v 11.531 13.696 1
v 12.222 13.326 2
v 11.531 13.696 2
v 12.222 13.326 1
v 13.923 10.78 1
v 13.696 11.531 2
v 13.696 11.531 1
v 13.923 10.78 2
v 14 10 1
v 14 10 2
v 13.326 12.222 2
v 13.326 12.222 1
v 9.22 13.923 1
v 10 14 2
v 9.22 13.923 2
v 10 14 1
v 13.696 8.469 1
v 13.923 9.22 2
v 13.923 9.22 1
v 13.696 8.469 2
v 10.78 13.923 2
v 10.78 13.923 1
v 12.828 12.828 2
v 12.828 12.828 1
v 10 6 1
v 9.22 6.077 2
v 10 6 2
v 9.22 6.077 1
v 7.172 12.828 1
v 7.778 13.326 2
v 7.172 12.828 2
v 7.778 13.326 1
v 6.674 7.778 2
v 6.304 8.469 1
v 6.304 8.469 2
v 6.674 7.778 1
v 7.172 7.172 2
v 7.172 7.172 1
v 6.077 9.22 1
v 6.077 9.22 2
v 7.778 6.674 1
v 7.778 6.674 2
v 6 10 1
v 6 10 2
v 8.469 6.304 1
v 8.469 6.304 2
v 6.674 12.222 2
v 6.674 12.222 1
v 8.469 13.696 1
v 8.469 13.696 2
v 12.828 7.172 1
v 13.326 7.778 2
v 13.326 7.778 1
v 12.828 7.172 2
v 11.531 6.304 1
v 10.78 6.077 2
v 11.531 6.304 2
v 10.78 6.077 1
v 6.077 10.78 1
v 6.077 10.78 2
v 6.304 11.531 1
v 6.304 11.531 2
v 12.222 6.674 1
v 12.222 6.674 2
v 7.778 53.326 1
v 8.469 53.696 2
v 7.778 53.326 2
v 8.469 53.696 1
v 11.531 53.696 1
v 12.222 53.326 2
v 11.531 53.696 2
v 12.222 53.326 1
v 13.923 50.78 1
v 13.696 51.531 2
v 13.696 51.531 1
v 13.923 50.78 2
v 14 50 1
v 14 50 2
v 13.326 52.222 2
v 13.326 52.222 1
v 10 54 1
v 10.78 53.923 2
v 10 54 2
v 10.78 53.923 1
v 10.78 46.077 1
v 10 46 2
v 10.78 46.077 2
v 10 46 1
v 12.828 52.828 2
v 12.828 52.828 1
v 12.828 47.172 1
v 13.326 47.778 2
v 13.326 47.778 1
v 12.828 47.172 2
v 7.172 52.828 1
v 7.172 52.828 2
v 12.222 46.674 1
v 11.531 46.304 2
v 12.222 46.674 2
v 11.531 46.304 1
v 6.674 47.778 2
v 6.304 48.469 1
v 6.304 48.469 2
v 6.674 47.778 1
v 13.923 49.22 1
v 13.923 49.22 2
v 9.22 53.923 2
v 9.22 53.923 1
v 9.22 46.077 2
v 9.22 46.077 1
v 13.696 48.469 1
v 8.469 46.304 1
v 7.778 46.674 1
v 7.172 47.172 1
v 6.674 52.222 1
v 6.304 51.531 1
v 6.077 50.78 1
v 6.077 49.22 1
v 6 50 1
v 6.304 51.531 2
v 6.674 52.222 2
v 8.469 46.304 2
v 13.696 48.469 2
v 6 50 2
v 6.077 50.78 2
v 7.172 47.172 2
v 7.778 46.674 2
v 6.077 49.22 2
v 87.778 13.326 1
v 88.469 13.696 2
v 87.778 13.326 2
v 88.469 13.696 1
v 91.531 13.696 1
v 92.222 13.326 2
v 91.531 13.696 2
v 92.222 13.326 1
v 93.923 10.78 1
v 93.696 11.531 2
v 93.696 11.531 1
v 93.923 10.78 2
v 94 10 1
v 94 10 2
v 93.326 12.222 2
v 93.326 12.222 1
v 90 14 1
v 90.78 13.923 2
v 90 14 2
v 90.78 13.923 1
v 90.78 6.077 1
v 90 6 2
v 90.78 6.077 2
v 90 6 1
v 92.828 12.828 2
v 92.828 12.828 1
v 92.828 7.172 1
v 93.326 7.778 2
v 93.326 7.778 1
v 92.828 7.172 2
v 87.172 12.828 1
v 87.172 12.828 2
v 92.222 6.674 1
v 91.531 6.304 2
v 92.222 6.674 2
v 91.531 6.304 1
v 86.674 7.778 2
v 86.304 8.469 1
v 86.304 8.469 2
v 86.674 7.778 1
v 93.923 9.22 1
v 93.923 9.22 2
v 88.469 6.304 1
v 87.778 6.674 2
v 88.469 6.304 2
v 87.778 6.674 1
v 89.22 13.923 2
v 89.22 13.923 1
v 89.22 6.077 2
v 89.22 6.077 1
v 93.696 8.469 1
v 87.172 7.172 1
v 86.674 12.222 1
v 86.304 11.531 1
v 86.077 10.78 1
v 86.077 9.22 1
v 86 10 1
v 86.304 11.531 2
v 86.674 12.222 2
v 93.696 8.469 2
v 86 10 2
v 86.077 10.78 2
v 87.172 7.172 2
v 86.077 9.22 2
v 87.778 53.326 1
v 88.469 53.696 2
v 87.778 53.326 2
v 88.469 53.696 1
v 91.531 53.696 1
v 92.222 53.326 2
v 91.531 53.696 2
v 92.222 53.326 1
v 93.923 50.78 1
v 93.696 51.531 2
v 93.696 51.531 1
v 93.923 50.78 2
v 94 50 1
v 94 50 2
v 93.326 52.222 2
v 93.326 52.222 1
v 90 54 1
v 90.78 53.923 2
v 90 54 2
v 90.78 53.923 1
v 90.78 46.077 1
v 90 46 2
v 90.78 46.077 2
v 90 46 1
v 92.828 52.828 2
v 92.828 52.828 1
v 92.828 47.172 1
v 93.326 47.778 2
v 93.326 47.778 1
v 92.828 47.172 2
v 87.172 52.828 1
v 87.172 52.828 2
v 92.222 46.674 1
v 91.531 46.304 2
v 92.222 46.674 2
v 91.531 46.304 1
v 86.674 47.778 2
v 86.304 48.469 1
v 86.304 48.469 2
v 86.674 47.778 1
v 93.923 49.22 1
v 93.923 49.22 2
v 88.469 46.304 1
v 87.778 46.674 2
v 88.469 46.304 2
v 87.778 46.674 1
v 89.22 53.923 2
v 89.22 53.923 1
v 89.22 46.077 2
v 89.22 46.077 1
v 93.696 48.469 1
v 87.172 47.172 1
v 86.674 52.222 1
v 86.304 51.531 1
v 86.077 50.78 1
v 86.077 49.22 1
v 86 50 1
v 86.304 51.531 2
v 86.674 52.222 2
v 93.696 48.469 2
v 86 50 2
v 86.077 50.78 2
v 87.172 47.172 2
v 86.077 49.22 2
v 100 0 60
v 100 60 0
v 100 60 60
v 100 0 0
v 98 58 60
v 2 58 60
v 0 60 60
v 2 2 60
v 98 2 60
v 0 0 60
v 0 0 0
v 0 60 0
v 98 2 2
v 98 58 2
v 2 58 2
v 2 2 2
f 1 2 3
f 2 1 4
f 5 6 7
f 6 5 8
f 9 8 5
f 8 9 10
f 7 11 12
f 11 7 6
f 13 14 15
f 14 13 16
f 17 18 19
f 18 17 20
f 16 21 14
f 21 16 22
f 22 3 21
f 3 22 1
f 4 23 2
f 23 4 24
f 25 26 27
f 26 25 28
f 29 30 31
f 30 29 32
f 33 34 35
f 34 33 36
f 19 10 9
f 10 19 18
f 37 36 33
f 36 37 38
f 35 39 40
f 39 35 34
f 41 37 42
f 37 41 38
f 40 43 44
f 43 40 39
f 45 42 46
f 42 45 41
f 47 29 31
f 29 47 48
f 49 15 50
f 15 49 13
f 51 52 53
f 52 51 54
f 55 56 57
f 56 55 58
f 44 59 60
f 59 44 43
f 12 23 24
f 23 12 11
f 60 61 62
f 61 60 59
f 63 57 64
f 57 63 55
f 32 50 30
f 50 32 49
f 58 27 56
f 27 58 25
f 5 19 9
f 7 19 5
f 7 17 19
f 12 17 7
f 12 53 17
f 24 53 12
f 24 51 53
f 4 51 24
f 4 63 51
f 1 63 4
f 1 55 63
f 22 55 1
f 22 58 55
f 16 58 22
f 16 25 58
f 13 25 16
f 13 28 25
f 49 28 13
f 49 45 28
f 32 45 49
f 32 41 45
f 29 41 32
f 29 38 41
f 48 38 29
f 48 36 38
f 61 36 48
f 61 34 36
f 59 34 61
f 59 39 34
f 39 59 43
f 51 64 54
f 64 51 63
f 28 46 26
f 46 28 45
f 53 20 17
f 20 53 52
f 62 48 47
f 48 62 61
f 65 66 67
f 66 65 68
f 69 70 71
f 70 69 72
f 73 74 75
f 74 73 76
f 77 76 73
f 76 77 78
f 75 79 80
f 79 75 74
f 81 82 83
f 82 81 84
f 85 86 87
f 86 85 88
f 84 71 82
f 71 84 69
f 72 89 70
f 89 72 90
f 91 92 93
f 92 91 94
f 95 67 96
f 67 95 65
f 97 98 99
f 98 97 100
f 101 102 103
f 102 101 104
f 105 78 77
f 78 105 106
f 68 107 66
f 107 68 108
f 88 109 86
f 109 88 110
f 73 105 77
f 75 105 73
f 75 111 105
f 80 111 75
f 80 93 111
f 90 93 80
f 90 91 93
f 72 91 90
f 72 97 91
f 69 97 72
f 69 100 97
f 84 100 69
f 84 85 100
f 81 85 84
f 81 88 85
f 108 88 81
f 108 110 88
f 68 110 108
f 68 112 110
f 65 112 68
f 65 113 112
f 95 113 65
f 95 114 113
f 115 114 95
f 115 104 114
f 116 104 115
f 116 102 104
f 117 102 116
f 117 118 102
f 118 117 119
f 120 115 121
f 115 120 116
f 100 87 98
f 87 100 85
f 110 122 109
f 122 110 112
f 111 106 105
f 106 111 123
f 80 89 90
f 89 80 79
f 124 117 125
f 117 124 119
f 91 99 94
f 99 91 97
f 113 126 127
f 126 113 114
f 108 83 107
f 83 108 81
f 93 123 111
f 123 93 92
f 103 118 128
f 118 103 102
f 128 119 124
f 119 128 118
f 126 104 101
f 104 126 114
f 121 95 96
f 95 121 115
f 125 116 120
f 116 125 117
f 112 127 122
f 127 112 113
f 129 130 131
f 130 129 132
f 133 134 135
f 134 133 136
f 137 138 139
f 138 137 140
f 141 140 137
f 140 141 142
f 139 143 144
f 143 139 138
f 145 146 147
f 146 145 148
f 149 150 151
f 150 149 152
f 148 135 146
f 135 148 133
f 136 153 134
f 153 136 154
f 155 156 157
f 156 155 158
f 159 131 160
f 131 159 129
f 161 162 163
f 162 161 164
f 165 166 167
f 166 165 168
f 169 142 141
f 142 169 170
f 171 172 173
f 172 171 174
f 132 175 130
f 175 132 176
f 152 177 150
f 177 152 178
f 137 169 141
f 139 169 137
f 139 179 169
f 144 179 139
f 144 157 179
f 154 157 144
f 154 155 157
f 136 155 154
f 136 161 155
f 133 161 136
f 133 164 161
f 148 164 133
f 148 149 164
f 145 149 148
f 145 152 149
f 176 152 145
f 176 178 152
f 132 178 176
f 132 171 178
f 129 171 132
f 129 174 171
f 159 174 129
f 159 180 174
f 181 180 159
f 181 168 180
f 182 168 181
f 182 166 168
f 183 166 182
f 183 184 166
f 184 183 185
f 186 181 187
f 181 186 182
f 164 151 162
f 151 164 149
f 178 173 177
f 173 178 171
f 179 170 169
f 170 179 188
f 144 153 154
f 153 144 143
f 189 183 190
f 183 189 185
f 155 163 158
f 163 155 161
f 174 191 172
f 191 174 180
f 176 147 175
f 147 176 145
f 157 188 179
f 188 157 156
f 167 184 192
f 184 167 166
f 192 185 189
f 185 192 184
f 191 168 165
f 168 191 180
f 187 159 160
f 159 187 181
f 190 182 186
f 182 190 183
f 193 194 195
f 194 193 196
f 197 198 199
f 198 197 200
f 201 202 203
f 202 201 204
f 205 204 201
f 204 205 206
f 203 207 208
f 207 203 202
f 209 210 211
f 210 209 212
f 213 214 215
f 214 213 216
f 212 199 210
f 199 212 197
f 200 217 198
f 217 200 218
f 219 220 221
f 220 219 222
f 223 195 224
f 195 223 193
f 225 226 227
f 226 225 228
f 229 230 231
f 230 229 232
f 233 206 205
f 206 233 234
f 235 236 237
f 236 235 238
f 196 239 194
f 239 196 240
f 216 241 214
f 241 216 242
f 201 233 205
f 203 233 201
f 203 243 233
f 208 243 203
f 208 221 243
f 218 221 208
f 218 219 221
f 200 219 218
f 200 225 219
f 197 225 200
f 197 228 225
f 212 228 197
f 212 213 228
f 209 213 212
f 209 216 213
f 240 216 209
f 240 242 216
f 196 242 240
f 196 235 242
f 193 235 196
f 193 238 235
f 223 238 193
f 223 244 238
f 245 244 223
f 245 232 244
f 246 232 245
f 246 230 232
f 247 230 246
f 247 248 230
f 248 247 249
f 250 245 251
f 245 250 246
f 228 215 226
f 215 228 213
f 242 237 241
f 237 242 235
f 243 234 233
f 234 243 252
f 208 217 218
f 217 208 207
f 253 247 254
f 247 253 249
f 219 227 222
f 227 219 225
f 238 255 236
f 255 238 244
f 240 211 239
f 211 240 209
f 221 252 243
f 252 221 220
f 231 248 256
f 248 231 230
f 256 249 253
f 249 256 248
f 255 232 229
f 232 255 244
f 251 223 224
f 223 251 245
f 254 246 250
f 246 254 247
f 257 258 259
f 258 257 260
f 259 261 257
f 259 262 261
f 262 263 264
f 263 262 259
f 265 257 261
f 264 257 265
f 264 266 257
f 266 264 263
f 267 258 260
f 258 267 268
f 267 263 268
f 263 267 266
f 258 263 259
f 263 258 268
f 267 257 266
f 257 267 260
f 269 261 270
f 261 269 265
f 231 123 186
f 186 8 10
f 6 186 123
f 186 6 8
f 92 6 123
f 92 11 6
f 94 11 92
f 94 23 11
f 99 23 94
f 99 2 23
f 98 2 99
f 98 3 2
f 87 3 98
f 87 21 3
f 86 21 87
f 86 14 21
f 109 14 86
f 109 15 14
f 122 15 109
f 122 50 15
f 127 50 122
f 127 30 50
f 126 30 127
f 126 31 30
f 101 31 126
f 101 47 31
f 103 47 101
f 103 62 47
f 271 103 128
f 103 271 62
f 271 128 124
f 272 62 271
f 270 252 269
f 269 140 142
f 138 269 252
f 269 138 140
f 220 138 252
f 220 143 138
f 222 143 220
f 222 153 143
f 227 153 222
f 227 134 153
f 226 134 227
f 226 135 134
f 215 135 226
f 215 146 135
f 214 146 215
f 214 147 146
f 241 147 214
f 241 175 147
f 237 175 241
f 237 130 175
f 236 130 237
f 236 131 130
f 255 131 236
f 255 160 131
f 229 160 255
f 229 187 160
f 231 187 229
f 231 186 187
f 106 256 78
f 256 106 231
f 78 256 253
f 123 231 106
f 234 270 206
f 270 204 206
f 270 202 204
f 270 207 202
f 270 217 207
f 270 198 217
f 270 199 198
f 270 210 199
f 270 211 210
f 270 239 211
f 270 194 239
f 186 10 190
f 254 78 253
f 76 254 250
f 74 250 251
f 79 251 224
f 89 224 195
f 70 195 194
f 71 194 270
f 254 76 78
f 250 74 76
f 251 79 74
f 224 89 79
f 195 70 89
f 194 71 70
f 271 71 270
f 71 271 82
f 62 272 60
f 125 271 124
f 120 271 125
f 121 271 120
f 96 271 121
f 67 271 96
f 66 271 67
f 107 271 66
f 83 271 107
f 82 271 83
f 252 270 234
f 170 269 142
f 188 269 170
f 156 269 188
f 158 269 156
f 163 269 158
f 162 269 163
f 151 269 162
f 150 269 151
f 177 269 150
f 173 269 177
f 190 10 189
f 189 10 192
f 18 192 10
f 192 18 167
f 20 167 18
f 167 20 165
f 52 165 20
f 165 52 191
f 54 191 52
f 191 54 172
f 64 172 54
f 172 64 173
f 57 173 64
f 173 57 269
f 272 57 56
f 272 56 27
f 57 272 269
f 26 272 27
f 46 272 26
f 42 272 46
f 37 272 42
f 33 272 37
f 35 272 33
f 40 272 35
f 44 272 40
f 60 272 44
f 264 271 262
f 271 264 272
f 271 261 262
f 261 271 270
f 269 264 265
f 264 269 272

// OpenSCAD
$fn = 32;

// ----------------------------------------------------------------------
// Enclosure box: bosses enclosure
// ----------------------------------------------------------------------

// --- parameters (mm) ---
box_l = 100;              // outer length, X
box_w = 60;               // outer width, Y
box_h = 60;               // outer height
wall_t = 2;               // wall thickness
boss_r = 4;               // corner boss radius
hole_r = 1.5;             // boss screw hole radius
boss_in = 10;             // boss inset from the corners

inner_h = box_h - wall_t;  // cavity depth
boss_h = inner_h - 2;  // corner boss height

difference() {
  cube([box_l, box_w, box_h]);
  translate([wall_t, wall_t, wall_t])
    cube([box_l - 2 * wall_t, box_w - 2 * wall_t, box_h]);
  for (sx = [0, 1], sy = [0, 1])
    translate([sx ? box_l - boss_in : boss_in,
               sy ? box_w - boss_in : boss_in, wall_t - 1]) {
      cylinder(r = boss_r, h = boss_h);
      translate([0, 0, boss_h - 4])
        cylinder(r = hole_r, h = 5);
    }
}
